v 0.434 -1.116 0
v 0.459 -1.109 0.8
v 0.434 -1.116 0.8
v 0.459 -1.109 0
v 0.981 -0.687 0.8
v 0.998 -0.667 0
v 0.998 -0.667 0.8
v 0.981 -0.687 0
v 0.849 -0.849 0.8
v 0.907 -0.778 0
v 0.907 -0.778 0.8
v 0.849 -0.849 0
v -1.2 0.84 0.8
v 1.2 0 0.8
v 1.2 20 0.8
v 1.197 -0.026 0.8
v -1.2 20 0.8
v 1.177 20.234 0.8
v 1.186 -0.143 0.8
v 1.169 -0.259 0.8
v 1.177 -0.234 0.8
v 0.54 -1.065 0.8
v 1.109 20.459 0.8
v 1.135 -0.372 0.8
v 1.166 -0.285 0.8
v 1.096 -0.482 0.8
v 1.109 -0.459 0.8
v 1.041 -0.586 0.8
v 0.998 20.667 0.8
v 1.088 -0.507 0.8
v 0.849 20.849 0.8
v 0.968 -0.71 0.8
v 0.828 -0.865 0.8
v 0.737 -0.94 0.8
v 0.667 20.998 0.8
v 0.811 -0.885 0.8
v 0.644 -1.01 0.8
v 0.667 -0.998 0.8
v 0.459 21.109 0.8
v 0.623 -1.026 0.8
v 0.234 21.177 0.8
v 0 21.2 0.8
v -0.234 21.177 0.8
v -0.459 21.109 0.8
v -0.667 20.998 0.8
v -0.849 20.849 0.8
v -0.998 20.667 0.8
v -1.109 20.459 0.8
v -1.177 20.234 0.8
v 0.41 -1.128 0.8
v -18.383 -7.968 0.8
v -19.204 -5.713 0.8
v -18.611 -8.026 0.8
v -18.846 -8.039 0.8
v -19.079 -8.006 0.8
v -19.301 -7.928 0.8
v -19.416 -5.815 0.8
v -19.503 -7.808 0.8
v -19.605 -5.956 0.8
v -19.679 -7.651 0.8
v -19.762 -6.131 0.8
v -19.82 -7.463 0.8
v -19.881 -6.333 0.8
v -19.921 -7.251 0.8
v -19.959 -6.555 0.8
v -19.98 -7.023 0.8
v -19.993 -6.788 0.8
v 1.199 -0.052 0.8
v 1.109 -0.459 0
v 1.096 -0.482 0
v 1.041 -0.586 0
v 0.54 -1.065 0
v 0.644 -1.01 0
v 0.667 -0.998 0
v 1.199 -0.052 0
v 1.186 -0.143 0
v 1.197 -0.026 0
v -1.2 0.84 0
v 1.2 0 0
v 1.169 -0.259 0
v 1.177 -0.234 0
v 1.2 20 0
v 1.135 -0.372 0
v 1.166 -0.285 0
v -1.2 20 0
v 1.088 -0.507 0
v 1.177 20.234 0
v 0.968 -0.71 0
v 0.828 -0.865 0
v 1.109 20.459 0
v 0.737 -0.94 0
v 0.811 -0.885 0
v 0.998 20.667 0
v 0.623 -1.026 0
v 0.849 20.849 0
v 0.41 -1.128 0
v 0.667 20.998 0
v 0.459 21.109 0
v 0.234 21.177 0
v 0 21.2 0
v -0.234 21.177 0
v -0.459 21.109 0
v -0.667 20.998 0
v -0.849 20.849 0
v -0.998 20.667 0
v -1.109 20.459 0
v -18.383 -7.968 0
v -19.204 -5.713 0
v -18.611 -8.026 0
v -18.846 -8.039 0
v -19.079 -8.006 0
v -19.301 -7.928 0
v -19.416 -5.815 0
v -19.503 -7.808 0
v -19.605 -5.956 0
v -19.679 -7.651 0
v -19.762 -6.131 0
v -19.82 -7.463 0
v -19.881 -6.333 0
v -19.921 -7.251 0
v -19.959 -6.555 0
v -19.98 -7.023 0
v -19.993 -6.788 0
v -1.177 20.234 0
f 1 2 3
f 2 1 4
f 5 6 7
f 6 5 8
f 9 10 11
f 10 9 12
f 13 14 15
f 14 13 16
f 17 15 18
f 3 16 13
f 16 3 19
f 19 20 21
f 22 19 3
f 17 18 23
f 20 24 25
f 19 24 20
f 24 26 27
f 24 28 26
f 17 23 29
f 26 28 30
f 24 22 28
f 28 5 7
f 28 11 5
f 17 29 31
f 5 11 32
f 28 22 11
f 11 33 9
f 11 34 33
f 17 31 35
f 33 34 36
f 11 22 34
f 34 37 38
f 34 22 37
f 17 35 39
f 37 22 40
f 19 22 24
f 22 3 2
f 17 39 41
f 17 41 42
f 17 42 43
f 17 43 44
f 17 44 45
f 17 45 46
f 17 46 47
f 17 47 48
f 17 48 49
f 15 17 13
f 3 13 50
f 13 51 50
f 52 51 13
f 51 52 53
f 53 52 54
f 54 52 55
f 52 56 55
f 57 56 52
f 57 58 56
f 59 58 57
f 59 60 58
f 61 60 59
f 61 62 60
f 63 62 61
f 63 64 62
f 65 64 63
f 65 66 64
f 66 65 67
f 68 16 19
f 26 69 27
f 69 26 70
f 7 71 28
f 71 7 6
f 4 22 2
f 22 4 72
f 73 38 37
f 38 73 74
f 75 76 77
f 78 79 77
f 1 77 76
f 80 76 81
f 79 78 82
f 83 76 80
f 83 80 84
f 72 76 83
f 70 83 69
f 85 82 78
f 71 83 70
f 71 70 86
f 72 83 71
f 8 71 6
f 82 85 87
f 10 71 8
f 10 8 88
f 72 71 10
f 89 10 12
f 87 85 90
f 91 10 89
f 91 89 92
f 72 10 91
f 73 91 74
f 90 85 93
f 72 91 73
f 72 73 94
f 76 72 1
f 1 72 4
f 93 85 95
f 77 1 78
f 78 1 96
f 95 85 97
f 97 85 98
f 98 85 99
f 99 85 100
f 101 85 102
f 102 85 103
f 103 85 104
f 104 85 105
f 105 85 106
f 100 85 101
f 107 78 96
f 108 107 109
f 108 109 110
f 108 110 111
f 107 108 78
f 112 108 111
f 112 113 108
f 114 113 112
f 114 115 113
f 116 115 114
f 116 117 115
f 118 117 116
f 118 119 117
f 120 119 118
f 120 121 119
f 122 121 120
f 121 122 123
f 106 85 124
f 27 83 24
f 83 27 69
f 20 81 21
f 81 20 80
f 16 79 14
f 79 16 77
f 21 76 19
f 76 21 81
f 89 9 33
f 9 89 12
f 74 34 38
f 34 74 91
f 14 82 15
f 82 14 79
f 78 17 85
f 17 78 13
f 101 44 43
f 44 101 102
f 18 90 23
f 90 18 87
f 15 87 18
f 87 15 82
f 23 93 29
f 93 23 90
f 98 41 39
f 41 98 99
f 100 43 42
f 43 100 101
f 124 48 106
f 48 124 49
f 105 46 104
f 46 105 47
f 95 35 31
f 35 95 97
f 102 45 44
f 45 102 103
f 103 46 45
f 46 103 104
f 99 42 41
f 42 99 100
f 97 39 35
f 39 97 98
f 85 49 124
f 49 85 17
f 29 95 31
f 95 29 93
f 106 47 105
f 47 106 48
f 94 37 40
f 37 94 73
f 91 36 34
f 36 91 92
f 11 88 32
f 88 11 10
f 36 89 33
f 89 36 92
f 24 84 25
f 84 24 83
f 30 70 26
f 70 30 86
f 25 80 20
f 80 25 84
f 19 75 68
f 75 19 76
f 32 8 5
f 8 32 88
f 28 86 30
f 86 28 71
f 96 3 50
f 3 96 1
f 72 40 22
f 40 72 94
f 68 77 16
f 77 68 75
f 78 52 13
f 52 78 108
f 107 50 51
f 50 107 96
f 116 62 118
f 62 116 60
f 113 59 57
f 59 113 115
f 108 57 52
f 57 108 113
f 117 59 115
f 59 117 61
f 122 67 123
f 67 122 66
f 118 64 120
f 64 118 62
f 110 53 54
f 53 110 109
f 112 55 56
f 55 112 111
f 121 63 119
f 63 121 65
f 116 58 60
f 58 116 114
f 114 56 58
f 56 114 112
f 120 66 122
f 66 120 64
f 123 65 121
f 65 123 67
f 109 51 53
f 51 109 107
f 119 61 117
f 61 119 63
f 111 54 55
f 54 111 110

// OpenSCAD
$fn=32;
lineWidth=0.4;
w=lineWidth*6;
h=lineWidth*2;

lineLength=20;

bar();
rotate([0,0,110]) bar();

module bar() {
  cylinder(r=w/2,h=h);
  translate([-w/2,0,0]) cube([w,lineLength,h]);
  translate([0,lineLength,0])  cylinder(r=w/2,h=h);

}
